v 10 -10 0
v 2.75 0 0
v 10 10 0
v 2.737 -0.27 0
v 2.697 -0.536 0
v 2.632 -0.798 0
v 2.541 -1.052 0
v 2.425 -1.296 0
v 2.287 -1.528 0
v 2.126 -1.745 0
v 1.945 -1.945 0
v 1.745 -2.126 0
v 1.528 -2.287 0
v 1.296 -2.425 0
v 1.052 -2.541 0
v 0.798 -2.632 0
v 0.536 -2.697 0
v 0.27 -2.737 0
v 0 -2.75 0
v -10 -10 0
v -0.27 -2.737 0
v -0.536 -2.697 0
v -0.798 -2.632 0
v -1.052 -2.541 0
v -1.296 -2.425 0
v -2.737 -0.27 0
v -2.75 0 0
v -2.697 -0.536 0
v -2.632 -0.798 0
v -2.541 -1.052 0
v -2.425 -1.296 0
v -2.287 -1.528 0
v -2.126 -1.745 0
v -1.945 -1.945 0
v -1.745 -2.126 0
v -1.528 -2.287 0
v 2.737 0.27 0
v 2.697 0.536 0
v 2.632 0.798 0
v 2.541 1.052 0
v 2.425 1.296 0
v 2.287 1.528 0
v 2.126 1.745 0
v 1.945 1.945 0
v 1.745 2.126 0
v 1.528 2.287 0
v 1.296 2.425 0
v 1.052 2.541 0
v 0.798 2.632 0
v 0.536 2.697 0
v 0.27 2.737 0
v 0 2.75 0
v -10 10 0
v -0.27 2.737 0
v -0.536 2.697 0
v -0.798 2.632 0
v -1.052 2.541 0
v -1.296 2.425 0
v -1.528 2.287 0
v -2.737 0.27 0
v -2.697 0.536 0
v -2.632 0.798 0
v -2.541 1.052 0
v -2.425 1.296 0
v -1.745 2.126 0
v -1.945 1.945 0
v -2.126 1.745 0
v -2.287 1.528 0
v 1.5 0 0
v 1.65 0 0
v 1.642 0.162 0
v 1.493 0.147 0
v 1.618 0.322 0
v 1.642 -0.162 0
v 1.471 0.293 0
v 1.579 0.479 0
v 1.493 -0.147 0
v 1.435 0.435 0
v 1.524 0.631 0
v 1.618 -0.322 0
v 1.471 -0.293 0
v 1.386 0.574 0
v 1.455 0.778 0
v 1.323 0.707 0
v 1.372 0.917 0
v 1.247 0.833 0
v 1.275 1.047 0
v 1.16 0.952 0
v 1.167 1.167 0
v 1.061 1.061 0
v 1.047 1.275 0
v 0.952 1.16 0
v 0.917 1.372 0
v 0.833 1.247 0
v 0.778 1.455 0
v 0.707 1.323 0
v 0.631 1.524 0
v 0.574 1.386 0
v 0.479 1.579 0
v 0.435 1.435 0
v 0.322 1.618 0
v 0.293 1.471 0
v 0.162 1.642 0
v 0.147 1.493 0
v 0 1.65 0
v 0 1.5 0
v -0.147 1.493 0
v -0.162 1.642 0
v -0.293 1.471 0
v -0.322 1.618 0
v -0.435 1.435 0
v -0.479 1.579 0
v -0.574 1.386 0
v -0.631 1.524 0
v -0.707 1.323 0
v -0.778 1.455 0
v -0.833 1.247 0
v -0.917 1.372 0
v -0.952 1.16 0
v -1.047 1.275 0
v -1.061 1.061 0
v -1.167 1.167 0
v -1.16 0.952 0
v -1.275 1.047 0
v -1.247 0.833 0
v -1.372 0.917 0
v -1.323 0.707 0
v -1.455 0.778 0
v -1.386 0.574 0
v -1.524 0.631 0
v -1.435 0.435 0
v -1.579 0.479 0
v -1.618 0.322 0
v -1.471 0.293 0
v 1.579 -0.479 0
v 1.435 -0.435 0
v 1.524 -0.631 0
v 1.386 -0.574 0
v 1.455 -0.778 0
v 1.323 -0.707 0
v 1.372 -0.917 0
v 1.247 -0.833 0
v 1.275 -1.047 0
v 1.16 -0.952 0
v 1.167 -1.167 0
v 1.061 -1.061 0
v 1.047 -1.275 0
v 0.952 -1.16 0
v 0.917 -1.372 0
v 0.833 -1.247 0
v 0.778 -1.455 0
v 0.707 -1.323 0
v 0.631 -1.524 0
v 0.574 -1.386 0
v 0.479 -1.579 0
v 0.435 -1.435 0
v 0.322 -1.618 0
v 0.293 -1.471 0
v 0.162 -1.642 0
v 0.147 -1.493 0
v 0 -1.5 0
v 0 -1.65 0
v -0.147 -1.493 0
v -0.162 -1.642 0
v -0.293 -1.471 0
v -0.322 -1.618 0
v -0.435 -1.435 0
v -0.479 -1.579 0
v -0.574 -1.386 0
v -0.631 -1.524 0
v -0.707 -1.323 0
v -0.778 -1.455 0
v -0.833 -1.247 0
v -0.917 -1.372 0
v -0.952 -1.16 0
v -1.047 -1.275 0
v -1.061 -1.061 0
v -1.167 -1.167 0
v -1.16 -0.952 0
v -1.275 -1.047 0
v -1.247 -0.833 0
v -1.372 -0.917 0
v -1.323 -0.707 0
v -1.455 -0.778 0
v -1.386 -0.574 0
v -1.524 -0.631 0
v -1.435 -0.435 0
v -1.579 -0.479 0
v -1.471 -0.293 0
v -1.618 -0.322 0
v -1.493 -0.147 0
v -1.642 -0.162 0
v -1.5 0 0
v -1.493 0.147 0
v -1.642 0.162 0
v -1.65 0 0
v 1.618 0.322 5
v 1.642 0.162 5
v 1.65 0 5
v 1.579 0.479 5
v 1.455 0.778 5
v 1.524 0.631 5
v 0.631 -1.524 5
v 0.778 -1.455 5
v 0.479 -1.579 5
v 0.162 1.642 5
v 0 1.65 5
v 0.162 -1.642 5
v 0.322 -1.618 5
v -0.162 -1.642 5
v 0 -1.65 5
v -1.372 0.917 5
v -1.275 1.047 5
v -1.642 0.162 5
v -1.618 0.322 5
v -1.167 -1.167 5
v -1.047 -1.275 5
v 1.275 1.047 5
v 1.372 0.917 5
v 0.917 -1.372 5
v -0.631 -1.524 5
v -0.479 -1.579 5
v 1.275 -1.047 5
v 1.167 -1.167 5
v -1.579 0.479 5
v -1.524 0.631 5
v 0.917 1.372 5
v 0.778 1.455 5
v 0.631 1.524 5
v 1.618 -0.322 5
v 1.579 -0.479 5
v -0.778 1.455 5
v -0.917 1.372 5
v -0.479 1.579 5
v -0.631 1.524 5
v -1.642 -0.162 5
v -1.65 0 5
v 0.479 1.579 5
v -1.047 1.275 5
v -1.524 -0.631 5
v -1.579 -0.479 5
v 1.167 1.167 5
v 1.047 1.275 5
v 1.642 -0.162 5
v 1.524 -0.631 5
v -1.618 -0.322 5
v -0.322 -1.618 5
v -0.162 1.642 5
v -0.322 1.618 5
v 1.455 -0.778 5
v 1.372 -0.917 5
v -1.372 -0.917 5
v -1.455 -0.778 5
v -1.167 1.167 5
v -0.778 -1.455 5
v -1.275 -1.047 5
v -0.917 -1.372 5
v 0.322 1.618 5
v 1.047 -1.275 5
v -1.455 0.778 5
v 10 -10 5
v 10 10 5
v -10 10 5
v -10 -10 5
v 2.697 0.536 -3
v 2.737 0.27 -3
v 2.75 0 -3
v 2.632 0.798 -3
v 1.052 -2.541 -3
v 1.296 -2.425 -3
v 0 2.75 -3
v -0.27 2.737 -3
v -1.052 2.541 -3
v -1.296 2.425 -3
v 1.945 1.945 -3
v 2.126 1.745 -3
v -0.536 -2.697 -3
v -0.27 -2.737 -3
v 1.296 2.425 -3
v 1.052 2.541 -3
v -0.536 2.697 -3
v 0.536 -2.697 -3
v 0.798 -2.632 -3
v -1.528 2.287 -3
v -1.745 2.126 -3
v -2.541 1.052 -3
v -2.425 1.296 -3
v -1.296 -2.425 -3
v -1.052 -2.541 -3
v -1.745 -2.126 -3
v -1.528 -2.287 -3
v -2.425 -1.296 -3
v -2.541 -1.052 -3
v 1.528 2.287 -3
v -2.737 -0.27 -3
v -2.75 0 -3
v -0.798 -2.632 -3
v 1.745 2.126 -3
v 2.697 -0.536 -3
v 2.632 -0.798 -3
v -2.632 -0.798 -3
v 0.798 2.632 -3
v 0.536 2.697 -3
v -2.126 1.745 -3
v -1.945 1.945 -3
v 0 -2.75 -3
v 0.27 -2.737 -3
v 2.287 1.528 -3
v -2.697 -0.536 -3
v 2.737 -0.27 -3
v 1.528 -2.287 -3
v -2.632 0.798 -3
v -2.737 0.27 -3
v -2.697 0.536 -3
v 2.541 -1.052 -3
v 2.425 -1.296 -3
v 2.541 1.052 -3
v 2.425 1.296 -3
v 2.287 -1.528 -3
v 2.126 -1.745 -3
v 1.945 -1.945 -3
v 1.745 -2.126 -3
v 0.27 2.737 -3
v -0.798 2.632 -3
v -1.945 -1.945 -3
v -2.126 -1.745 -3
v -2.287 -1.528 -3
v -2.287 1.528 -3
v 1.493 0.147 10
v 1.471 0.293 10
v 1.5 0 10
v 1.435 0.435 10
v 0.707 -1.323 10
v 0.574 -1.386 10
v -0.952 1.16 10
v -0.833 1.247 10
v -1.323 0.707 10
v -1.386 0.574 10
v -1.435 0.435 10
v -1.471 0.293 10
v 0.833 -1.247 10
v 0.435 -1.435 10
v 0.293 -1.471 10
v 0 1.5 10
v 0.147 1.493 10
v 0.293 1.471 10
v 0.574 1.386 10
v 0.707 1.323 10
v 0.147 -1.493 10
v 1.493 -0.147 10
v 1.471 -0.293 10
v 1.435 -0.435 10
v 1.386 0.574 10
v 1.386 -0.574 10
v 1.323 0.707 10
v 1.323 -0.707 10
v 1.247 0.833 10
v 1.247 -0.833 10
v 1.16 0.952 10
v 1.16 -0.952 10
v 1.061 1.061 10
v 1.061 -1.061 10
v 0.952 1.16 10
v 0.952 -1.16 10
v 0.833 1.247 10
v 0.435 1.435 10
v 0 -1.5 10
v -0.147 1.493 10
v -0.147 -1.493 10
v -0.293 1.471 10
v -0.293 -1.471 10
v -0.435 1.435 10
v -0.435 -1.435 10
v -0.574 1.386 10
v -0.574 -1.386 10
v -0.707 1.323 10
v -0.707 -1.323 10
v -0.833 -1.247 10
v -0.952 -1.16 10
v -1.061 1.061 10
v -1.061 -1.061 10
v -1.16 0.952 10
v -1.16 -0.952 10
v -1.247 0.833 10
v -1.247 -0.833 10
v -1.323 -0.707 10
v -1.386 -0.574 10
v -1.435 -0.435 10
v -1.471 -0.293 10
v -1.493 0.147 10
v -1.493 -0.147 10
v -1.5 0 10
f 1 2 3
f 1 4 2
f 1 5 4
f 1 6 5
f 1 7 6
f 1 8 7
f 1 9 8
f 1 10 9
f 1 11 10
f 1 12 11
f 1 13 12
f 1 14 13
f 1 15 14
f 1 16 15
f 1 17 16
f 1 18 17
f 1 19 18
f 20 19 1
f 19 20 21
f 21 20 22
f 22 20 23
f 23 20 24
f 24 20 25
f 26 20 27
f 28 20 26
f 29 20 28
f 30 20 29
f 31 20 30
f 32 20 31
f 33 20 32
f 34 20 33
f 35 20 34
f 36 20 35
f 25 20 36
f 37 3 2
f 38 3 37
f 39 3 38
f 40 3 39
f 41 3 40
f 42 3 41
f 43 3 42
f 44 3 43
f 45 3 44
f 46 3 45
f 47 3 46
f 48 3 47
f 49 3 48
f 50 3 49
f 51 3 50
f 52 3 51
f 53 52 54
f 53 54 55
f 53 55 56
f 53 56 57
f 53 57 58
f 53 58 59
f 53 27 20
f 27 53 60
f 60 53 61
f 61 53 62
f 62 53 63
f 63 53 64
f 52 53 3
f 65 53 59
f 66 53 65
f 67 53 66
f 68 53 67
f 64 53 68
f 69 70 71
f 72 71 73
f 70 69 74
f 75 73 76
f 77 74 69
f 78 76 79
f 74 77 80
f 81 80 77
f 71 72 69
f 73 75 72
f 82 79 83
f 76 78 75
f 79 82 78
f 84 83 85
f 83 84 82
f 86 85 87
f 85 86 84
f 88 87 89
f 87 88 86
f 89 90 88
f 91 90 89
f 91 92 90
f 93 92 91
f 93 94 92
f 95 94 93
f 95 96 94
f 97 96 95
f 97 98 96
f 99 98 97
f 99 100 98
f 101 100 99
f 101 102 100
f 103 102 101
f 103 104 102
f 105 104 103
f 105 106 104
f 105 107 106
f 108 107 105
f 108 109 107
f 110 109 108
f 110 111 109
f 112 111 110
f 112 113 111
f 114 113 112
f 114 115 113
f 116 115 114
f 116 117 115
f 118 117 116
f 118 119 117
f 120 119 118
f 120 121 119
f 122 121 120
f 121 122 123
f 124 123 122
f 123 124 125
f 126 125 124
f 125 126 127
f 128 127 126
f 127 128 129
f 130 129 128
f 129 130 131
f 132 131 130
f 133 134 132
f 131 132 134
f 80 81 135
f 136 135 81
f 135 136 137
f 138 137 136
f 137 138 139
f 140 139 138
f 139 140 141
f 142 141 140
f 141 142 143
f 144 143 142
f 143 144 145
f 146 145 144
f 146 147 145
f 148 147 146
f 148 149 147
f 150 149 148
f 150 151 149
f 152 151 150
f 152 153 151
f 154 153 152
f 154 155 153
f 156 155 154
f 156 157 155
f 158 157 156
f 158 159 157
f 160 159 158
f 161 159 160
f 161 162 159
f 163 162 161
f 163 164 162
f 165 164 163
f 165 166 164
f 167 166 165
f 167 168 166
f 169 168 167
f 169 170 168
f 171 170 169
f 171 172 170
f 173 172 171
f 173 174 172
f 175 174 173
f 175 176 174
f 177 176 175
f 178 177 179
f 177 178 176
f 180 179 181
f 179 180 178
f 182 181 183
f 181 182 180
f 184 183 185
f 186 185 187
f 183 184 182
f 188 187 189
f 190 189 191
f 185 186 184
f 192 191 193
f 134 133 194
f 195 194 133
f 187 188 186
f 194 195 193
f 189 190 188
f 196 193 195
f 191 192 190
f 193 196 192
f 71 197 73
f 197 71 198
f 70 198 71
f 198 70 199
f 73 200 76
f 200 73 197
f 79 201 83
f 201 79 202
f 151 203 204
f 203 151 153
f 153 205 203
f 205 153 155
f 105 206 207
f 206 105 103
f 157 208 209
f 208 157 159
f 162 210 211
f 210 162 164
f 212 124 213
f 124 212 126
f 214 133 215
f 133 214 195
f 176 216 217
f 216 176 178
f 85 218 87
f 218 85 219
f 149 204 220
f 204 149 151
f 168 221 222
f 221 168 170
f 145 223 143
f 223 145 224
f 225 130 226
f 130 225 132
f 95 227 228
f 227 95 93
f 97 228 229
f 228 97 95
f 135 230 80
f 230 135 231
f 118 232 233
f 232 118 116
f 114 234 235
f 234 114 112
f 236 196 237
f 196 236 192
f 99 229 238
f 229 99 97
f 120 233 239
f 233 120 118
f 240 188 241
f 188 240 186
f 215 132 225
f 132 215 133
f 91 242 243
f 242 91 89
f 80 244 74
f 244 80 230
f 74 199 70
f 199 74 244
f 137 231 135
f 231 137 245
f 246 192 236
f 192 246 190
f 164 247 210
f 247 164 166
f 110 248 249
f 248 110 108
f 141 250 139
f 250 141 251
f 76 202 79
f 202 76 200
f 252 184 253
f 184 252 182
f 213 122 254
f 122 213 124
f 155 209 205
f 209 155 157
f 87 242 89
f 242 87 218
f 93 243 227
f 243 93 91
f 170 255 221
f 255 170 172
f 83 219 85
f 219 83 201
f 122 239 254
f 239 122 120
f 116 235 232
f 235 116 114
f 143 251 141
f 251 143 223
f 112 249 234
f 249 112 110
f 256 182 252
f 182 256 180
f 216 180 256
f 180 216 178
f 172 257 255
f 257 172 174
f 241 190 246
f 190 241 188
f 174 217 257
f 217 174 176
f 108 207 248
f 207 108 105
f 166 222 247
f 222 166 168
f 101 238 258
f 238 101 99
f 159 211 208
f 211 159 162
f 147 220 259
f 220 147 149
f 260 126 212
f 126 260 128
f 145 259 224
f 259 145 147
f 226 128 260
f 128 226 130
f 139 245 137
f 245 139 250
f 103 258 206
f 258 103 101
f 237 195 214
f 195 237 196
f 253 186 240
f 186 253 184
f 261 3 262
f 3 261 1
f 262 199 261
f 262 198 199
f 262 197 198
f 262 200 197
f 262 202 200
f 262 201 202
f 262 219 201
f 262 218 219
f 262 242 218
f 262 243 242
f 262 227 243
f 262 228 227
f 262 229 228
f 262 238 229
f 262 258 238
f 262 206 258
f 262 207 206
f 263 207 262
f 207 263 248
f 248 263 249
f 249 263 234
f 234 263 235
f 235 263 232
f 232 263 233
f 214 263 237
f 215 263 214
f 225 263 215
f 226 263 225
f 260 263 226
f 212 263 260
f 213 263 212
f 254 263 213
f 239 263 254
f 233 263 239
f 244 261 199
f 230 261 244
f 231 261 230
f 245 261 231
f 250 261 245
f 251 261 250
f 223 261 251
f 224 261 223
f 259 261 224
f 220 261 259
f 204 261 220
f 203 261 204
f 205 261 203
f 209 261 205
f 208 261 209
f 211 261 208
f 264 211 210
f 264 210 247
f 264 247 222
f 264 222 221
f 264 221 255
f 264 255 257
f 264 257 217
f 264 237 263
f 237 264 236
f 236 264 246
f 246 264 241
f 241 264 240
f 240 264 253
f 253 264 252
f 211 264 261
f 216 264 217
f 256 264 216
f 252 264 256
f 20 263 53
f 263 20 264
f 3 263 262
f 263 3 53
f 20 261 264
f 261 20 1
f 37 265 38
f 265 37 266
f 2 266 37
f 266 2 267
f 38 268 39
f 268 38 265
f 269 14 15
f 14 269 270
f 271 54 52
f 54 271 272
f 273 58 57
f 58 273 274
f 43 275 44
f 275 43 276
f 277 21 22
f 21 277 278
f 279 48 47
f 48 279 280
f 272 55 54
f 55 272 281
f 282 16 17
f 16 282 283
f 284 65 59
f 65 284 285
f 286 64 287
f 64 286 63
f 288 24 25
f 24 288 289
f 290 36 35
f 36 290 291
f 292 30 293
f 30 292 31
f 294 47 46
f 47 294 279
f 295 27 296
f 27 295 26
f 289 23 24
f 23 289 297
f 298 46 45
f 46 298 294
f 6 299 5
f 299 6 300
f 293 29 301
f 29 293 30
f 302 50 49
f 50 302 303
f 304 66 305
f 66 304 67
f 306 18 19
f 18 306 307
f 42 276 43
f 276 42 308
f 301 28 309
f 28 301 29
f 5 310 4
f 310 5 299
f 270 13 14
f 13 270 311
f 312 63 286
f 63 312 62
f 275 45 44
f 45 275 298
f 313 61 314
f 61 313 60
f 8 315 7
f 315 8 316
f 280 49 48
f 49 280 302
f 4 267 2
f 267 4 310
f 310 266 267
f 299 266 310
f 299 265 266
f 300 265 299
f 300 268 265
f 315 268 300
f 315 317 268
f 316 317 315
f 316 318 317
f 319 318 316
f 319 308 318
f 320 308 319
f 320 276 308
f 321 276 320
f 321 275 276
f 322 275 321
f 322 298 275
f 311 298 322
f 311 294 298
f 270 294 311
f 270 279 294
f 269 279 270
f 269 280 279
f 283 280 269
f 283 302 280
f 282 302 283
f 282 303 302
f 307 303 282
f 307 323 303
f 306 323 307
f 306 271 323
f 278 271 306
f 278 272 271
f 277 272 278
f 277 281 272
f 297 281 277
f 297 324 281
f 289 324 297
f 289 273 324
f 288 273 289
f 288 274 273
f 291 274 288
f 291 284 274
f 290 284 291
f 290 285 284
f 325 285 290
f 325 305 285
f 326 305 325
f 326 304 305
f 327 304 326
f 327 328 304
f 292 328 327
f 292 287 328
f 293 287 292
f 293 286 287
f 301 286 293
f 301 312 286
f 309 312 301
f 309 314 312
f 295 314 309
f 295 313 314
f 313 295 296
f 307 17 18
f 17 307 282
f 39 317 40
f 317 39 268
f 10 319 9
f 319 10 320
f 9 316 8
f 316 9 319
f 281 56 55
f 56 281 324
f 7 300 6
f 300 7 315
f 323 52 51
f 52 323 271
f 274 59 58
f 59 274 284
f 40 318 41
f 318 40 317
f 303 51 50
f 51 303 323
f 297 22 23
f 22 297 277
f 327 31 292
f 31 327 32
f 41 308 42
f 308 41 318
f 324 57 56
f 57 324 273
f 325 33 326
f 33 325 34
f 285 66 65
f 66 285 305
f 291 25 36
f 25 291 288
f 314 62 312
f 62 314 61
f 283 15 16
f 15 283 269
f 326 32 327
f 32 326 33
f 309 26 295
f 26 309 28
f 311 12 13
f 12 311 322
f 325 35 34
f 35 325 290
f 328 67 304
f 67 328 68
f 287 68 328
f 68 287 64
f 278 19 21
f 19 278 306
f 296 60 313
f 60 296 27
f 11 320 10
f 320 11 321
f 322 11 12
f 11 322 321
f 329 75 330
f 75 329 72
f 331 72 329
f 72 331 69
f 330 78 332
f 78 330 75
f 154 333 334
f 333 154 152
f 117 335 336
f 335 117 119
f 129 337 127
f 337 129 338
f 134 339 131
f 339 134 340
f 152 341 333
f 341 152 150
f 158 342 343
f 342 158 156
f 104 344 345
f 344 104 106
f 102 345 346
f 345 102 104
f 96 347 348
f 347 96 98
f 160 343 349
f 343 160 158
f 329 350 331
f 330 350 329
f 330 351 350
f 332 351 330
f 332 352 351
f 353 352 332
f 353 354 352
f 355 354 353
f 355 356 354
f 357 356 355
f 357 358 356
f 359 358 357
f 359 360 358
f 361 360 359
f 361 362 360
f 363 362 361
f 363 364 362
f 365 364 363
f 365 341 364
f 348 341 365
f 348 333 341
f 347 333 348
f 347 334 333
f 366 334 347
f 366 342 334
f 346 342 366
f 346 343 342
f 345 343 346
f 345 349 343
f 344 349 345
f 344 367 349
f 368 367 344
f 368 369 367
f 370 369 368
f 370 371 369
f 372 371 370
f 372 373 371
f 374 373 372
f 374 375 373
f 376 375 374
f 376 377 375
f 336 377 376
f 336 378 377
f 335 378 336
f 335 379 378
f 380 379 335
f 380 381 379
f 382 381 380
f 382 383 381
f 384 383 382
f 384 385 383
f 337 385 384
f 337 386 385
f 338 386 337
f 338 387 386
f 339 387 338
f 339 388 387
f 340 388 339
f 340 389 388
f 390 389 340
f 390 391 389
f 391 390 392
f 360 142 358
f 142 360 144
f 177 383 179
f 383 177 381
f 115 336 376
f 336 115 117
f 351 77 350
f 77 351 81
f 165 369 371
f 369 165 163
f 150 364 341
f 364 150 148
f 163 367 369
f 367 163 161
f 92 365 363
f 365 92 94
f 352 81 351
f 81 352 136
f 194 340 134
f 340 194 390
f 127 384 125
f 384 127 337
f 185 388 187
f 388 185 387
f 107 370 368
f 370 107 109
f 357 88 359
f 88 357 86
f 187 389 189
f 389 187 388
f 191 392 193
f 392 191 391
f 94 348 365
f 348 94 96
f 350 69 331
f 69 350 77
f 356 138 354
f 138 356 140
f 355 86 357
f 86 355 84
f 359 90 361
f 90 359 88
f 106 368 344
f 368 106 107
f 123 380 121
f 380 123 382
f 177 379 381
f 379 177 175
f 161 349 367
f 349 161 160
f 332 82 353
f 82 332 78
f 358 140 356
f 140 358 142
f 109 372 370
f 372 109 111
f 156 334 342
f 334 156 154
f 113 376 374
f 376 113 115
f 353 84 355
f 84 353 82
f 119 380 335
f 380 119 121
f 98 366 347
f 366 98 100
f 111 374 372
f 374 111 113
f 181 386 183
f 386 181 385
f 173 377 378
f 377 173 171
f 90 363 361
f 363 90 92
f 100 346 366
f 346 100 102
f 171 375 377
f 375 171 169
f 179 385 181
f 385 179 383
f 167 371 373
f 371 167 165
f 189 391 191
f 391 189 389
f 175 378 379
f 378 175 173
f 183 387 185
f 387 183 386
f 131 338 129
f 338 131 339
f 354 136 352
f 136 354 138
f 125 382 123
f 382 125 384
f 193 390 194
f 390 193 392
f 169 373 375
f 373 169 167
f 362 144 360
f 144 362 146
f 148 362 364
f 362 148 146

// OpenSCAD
$fn=64;
union(){difference(){translate(v = [-10.000, -10.000])
cube(size = [20, 20, 5]);
union(){color("Gainsboro"){translate(v = [0, 0, -3])
cylinder(h = 3, r = 2.750);
}
color("DarkGray"){cylinder(h = 10, r = 1.650);
}
}
}
union(){color("Gainsboro"){translate(v = [0, 0, -3])
cylinder(h = 3, r = 2.750);
}
color("DarkGray"){cylinder(h = 10, r = 1.500);
}
}
}
